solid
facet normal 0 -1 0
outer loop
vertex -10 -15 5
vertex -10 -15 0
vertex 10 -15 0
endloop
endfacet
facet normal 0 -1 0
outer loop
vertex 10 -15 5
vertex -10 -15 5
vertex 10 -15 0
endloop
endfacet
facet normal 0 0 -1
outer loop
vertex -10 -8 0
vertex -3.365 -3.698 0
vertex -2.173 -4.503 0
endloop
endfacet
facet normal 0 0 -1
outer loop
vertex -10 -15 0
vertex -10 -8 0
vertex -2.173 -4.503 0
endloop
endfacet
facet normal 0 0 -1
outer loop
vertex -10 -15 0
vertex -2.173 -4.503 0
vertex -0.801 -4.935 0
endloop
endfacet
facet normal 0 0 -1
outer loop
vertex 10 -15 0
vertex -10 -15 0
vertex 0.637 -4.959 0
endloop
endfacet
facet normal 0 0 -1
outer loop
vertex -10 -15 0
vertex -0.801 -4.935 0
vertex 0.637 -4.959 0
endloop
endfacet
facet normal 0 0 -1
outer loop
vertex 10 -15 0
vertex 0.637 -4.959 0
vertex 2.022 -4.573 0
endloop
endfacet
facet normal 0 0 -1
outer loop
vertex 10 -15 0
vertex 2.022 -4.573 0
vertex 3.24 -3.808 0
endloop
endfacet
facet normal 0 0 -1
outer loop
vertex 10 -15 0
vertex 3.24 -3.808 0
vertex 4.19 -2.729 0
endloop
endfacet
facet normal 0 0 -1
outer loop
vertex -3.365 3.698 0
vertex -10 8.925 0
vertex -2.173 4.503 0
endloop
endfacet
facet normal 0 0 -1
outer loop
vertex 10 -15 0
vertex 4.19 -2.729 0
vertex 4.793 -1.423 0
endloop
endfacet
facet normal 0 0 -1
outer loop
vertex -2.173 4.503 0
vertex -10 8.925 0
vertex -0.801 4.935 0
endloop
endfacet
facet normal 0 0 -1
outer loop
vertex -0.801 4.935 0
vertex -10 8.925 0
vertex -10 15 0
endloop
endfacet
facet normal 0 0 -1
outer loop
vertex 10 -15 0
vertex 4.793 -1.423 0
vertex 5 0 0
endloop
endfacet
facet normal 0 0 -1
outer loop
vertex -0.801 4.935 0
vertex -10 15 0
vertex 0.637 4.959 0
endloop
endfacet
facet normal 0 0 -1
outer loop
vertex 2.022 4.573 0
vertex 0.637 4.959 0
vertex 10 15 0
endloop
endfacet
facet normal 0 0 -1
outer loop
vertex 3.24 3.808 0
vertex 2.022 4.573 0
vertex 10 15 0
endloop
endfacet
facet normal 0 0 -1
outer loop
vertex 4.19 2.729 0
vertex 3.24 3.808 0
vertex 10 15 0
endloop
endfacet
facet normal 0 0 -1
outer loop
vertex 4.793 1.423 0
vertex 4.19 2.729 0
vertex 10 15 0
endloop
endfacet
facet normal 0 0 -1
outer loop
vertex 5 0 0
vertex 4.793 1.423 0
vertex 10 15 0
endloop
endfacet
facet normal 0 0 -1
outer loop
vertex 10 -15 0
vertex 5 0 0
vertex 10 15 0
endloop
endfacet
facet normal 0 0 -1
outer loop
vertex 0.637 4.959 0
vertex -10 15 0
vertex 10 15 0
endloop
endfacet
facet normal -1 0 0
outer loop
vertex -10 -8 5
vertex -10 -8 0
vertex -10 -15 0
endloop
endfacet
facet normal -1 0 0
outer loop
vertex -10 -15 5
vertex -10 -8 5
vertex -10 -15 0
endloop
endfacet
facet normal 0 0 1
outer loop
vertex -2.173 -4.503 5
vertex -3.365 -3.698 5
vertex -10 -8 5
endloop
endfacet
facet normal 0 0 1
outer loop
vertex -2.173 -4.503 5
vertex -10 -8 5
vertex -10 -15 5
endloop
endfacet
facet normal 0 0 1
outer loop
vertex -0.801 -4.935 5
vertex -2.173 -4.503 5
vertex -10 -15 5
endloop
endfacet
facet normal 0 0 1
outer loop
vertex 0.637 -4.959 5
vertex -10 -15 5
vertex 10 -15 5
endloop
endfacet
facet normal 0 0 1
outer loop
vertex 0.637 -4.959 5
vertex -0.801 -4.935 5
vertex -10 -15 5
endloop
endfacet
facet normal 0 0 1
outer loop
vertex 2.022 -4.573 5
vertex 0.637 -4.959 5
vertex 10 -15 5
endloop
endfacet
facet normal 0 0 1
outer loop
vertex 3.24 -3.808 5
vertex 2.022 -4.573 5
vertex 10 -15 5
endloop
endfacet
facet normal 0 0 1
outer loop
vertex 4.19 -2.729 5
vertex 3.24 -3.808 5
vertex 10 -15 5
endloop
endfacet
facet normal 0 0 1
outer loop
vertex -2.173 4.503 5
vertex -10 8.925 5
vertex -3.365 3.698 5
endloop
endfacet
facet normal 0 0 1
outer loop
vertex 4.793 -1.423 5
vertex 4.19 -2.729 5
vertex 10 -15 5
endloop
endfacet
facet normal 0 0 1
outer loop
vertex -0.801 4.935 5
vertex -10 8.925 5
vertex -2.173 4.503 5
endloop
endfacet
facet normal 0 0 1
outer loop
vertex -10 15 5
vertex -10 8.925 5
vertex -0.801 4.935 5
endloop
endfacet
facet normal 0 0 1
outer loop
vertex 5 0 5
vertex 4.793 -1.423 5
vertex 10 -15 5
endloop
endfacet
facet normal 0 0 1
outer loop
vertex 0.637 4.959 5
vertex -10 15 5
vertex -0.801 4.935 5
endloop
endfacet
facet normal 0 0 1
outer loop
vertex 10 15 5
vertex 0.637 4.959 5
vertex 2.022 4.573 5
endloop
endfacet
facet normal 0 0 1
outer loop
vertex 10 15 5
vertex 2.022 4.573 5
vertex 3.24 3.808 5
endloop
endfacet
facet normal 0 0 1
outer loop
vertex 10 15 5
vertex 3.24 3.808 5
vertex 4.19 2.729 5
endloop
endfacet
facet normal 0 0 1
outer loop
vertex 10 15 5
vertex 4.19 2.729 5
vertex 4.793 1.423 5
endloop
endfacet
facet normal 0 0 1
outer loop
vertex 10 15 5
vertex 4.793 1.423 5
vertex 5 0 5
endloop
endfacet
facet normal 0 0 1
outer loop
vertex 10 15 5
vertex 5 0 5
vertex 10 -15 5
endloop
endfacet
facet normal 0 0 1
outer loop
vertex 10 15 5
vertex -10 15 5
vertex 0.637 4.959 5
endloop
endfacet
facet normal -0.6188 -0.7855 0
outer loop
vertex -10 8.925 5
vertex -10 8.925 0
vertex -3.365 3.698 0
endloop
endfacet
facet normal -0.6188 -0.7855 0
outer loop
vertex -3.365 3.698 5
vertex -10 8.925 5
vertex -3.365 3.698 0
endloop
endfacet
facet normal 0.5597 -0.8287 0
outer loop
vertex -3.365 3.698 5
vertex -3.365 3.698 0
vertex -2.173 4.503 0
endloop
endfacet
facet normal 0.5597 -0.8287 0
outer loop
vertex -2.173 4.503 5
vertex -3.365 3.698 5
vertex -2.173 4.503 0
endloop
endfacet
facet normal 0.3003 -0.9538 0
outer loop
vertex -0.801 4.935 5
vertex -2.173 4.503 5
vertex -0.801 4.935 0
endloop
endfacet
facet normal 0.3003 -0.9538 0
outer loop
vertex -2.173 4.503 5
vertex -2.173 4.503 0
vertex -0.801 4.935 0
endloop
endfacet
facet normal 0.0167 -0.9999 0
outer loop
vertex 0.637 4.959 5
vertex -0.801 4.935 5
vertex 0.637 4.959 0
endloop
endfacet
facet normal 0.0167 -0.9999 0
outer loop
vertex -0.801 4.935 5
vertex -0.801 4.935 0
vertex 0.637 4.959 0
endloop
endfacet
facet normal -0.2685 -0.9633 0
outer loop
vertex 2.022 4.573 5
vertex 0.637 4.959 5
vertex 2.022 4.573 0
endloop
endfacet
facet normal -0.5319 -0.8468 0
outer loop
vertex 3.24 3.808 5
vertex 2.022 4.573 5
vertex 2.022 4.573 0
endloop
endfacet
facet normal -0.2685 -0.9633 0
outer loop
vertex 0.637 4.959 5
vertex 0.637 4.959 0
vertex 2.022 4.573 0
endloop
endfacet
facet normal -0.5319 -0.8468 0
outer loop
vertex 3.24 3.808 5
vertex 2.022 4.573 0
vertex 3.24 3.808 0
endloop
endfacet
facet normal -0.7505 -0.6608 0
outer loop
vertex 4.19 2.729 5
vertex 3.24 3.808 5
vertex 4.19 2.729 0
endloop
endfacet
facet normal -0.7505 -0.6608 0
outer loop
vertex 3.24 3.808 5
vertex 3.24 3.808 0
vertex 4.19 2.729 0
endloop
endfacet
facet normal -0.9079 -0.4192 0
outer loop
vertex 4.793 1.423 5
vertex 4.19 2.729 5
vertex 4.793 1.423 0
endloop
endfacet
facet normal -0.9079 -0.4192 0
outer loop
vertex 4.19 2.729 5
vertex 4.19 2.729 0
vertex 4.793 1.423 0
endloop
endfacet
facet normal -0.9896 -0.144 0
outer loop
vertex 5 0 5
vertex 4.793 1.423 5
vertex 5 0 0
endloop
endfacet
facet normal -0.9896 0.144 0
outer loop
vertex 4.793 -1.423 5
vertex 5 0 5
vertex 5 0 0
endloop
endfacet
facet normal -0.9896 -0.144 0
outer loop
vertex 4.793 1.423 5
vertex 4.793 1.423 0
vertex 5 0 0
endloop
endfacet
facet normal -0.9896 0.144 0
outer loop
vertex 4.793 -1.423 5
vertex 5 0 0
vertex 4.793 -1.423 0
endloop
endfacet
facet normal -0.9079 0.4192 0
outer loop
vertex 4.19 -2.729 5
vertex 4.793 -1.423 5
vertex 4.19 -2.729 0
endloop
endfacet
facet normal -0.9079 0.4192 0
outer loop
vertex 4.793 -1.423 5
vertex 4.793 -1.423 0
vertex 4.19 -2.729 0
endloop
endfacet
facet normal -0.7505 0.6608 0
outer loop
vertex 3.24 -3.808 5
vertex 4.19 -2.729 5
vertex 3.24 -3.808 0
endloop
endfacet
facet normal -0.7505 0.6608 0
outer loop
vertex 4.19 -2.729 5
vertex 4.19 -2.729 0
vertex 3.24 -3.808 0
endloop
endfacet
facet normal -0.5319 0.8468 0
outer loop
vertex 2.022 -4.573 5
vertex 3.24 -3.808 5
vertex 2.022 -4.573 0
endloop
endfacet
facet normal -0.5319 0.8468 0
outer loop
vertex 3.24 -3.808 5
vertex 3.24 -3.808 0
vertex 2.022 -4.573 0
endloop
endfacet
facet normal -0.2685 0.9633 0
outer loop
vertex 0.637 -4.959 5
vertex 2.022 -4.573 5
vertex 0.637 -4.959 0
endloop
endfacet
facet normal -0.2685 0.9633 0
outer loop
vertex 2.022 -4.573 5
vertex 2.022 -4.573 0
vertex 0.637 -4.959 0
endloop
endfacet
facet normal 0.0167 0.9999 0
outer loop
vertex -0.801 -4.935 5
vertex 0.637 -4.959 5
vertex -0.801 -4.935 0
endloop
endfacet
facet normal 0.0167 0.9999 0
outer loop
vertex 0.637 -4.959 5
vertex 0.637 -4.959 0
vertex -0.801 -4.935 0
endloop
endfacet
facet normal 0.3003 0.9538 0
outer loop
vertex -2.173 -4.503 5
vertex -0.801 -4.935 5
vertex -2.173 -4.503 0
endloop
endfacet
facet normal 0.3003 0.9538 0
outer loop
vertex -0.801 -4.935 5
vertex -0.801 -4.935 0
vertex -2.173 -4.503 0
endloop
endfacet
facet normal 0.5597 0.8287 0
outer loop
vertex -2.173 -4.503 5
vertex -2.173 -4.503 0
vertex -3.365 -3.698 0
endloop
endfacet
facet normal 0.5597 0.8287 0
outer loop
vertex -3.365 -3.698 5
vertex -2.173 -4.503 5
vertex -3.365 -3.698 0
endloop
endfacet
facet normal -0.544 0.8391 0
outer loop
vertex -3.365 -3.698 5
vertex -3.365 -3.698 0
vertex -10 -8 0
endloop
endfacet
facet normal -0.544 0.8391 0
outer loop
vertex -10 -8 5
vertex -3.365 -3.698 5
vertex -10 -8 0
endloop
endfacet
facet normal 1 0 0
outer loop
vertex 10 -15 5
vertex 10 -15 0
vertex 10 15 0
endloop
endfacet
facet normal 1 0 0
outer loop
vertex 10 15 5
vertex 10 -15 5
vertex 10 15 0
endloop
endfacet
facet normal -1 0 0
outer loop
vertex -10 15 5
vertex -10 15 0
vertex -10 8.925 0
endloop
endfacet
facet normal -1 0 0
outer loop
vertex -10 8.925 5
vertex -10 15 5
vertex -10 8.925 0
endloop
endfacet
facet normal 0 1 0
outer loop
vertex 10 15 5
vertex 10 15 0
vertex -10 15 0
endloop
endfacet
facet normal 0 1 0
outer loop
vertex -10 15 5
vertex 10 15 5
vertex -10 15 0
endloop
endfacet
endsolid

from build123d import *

# Parameters (mm, degrees)
BOSS_EXTRU_1_DEPTH = 5


with BuildPart() as part:
    # Esquisse1 → Boss.-Extru.1 (new body)
    with BuildSketch(Plane.XY):
        with BuildLine():
            Line((-10, 15), (-10, 8.925037924))
            Line((-10, 8.925037924), (-3.364765454, 3.698425806))
            ThreePointArc((-3.364765454, 3.698425806), (5, 0), (-3.364765454, -3.698425806))
            Line((-3.364765454, -3.698425806), (-10, -8))
            Line((-10, -8), (-10, -15))
            Line((-10, -15), (10, -15))
            Line((10, -15), (10, 15))
            Line((10, 15), (-10, 15))
        make_face()
    extrude(amount=BOSS_EXTRU_1_DEPTH)


solid = part.part
